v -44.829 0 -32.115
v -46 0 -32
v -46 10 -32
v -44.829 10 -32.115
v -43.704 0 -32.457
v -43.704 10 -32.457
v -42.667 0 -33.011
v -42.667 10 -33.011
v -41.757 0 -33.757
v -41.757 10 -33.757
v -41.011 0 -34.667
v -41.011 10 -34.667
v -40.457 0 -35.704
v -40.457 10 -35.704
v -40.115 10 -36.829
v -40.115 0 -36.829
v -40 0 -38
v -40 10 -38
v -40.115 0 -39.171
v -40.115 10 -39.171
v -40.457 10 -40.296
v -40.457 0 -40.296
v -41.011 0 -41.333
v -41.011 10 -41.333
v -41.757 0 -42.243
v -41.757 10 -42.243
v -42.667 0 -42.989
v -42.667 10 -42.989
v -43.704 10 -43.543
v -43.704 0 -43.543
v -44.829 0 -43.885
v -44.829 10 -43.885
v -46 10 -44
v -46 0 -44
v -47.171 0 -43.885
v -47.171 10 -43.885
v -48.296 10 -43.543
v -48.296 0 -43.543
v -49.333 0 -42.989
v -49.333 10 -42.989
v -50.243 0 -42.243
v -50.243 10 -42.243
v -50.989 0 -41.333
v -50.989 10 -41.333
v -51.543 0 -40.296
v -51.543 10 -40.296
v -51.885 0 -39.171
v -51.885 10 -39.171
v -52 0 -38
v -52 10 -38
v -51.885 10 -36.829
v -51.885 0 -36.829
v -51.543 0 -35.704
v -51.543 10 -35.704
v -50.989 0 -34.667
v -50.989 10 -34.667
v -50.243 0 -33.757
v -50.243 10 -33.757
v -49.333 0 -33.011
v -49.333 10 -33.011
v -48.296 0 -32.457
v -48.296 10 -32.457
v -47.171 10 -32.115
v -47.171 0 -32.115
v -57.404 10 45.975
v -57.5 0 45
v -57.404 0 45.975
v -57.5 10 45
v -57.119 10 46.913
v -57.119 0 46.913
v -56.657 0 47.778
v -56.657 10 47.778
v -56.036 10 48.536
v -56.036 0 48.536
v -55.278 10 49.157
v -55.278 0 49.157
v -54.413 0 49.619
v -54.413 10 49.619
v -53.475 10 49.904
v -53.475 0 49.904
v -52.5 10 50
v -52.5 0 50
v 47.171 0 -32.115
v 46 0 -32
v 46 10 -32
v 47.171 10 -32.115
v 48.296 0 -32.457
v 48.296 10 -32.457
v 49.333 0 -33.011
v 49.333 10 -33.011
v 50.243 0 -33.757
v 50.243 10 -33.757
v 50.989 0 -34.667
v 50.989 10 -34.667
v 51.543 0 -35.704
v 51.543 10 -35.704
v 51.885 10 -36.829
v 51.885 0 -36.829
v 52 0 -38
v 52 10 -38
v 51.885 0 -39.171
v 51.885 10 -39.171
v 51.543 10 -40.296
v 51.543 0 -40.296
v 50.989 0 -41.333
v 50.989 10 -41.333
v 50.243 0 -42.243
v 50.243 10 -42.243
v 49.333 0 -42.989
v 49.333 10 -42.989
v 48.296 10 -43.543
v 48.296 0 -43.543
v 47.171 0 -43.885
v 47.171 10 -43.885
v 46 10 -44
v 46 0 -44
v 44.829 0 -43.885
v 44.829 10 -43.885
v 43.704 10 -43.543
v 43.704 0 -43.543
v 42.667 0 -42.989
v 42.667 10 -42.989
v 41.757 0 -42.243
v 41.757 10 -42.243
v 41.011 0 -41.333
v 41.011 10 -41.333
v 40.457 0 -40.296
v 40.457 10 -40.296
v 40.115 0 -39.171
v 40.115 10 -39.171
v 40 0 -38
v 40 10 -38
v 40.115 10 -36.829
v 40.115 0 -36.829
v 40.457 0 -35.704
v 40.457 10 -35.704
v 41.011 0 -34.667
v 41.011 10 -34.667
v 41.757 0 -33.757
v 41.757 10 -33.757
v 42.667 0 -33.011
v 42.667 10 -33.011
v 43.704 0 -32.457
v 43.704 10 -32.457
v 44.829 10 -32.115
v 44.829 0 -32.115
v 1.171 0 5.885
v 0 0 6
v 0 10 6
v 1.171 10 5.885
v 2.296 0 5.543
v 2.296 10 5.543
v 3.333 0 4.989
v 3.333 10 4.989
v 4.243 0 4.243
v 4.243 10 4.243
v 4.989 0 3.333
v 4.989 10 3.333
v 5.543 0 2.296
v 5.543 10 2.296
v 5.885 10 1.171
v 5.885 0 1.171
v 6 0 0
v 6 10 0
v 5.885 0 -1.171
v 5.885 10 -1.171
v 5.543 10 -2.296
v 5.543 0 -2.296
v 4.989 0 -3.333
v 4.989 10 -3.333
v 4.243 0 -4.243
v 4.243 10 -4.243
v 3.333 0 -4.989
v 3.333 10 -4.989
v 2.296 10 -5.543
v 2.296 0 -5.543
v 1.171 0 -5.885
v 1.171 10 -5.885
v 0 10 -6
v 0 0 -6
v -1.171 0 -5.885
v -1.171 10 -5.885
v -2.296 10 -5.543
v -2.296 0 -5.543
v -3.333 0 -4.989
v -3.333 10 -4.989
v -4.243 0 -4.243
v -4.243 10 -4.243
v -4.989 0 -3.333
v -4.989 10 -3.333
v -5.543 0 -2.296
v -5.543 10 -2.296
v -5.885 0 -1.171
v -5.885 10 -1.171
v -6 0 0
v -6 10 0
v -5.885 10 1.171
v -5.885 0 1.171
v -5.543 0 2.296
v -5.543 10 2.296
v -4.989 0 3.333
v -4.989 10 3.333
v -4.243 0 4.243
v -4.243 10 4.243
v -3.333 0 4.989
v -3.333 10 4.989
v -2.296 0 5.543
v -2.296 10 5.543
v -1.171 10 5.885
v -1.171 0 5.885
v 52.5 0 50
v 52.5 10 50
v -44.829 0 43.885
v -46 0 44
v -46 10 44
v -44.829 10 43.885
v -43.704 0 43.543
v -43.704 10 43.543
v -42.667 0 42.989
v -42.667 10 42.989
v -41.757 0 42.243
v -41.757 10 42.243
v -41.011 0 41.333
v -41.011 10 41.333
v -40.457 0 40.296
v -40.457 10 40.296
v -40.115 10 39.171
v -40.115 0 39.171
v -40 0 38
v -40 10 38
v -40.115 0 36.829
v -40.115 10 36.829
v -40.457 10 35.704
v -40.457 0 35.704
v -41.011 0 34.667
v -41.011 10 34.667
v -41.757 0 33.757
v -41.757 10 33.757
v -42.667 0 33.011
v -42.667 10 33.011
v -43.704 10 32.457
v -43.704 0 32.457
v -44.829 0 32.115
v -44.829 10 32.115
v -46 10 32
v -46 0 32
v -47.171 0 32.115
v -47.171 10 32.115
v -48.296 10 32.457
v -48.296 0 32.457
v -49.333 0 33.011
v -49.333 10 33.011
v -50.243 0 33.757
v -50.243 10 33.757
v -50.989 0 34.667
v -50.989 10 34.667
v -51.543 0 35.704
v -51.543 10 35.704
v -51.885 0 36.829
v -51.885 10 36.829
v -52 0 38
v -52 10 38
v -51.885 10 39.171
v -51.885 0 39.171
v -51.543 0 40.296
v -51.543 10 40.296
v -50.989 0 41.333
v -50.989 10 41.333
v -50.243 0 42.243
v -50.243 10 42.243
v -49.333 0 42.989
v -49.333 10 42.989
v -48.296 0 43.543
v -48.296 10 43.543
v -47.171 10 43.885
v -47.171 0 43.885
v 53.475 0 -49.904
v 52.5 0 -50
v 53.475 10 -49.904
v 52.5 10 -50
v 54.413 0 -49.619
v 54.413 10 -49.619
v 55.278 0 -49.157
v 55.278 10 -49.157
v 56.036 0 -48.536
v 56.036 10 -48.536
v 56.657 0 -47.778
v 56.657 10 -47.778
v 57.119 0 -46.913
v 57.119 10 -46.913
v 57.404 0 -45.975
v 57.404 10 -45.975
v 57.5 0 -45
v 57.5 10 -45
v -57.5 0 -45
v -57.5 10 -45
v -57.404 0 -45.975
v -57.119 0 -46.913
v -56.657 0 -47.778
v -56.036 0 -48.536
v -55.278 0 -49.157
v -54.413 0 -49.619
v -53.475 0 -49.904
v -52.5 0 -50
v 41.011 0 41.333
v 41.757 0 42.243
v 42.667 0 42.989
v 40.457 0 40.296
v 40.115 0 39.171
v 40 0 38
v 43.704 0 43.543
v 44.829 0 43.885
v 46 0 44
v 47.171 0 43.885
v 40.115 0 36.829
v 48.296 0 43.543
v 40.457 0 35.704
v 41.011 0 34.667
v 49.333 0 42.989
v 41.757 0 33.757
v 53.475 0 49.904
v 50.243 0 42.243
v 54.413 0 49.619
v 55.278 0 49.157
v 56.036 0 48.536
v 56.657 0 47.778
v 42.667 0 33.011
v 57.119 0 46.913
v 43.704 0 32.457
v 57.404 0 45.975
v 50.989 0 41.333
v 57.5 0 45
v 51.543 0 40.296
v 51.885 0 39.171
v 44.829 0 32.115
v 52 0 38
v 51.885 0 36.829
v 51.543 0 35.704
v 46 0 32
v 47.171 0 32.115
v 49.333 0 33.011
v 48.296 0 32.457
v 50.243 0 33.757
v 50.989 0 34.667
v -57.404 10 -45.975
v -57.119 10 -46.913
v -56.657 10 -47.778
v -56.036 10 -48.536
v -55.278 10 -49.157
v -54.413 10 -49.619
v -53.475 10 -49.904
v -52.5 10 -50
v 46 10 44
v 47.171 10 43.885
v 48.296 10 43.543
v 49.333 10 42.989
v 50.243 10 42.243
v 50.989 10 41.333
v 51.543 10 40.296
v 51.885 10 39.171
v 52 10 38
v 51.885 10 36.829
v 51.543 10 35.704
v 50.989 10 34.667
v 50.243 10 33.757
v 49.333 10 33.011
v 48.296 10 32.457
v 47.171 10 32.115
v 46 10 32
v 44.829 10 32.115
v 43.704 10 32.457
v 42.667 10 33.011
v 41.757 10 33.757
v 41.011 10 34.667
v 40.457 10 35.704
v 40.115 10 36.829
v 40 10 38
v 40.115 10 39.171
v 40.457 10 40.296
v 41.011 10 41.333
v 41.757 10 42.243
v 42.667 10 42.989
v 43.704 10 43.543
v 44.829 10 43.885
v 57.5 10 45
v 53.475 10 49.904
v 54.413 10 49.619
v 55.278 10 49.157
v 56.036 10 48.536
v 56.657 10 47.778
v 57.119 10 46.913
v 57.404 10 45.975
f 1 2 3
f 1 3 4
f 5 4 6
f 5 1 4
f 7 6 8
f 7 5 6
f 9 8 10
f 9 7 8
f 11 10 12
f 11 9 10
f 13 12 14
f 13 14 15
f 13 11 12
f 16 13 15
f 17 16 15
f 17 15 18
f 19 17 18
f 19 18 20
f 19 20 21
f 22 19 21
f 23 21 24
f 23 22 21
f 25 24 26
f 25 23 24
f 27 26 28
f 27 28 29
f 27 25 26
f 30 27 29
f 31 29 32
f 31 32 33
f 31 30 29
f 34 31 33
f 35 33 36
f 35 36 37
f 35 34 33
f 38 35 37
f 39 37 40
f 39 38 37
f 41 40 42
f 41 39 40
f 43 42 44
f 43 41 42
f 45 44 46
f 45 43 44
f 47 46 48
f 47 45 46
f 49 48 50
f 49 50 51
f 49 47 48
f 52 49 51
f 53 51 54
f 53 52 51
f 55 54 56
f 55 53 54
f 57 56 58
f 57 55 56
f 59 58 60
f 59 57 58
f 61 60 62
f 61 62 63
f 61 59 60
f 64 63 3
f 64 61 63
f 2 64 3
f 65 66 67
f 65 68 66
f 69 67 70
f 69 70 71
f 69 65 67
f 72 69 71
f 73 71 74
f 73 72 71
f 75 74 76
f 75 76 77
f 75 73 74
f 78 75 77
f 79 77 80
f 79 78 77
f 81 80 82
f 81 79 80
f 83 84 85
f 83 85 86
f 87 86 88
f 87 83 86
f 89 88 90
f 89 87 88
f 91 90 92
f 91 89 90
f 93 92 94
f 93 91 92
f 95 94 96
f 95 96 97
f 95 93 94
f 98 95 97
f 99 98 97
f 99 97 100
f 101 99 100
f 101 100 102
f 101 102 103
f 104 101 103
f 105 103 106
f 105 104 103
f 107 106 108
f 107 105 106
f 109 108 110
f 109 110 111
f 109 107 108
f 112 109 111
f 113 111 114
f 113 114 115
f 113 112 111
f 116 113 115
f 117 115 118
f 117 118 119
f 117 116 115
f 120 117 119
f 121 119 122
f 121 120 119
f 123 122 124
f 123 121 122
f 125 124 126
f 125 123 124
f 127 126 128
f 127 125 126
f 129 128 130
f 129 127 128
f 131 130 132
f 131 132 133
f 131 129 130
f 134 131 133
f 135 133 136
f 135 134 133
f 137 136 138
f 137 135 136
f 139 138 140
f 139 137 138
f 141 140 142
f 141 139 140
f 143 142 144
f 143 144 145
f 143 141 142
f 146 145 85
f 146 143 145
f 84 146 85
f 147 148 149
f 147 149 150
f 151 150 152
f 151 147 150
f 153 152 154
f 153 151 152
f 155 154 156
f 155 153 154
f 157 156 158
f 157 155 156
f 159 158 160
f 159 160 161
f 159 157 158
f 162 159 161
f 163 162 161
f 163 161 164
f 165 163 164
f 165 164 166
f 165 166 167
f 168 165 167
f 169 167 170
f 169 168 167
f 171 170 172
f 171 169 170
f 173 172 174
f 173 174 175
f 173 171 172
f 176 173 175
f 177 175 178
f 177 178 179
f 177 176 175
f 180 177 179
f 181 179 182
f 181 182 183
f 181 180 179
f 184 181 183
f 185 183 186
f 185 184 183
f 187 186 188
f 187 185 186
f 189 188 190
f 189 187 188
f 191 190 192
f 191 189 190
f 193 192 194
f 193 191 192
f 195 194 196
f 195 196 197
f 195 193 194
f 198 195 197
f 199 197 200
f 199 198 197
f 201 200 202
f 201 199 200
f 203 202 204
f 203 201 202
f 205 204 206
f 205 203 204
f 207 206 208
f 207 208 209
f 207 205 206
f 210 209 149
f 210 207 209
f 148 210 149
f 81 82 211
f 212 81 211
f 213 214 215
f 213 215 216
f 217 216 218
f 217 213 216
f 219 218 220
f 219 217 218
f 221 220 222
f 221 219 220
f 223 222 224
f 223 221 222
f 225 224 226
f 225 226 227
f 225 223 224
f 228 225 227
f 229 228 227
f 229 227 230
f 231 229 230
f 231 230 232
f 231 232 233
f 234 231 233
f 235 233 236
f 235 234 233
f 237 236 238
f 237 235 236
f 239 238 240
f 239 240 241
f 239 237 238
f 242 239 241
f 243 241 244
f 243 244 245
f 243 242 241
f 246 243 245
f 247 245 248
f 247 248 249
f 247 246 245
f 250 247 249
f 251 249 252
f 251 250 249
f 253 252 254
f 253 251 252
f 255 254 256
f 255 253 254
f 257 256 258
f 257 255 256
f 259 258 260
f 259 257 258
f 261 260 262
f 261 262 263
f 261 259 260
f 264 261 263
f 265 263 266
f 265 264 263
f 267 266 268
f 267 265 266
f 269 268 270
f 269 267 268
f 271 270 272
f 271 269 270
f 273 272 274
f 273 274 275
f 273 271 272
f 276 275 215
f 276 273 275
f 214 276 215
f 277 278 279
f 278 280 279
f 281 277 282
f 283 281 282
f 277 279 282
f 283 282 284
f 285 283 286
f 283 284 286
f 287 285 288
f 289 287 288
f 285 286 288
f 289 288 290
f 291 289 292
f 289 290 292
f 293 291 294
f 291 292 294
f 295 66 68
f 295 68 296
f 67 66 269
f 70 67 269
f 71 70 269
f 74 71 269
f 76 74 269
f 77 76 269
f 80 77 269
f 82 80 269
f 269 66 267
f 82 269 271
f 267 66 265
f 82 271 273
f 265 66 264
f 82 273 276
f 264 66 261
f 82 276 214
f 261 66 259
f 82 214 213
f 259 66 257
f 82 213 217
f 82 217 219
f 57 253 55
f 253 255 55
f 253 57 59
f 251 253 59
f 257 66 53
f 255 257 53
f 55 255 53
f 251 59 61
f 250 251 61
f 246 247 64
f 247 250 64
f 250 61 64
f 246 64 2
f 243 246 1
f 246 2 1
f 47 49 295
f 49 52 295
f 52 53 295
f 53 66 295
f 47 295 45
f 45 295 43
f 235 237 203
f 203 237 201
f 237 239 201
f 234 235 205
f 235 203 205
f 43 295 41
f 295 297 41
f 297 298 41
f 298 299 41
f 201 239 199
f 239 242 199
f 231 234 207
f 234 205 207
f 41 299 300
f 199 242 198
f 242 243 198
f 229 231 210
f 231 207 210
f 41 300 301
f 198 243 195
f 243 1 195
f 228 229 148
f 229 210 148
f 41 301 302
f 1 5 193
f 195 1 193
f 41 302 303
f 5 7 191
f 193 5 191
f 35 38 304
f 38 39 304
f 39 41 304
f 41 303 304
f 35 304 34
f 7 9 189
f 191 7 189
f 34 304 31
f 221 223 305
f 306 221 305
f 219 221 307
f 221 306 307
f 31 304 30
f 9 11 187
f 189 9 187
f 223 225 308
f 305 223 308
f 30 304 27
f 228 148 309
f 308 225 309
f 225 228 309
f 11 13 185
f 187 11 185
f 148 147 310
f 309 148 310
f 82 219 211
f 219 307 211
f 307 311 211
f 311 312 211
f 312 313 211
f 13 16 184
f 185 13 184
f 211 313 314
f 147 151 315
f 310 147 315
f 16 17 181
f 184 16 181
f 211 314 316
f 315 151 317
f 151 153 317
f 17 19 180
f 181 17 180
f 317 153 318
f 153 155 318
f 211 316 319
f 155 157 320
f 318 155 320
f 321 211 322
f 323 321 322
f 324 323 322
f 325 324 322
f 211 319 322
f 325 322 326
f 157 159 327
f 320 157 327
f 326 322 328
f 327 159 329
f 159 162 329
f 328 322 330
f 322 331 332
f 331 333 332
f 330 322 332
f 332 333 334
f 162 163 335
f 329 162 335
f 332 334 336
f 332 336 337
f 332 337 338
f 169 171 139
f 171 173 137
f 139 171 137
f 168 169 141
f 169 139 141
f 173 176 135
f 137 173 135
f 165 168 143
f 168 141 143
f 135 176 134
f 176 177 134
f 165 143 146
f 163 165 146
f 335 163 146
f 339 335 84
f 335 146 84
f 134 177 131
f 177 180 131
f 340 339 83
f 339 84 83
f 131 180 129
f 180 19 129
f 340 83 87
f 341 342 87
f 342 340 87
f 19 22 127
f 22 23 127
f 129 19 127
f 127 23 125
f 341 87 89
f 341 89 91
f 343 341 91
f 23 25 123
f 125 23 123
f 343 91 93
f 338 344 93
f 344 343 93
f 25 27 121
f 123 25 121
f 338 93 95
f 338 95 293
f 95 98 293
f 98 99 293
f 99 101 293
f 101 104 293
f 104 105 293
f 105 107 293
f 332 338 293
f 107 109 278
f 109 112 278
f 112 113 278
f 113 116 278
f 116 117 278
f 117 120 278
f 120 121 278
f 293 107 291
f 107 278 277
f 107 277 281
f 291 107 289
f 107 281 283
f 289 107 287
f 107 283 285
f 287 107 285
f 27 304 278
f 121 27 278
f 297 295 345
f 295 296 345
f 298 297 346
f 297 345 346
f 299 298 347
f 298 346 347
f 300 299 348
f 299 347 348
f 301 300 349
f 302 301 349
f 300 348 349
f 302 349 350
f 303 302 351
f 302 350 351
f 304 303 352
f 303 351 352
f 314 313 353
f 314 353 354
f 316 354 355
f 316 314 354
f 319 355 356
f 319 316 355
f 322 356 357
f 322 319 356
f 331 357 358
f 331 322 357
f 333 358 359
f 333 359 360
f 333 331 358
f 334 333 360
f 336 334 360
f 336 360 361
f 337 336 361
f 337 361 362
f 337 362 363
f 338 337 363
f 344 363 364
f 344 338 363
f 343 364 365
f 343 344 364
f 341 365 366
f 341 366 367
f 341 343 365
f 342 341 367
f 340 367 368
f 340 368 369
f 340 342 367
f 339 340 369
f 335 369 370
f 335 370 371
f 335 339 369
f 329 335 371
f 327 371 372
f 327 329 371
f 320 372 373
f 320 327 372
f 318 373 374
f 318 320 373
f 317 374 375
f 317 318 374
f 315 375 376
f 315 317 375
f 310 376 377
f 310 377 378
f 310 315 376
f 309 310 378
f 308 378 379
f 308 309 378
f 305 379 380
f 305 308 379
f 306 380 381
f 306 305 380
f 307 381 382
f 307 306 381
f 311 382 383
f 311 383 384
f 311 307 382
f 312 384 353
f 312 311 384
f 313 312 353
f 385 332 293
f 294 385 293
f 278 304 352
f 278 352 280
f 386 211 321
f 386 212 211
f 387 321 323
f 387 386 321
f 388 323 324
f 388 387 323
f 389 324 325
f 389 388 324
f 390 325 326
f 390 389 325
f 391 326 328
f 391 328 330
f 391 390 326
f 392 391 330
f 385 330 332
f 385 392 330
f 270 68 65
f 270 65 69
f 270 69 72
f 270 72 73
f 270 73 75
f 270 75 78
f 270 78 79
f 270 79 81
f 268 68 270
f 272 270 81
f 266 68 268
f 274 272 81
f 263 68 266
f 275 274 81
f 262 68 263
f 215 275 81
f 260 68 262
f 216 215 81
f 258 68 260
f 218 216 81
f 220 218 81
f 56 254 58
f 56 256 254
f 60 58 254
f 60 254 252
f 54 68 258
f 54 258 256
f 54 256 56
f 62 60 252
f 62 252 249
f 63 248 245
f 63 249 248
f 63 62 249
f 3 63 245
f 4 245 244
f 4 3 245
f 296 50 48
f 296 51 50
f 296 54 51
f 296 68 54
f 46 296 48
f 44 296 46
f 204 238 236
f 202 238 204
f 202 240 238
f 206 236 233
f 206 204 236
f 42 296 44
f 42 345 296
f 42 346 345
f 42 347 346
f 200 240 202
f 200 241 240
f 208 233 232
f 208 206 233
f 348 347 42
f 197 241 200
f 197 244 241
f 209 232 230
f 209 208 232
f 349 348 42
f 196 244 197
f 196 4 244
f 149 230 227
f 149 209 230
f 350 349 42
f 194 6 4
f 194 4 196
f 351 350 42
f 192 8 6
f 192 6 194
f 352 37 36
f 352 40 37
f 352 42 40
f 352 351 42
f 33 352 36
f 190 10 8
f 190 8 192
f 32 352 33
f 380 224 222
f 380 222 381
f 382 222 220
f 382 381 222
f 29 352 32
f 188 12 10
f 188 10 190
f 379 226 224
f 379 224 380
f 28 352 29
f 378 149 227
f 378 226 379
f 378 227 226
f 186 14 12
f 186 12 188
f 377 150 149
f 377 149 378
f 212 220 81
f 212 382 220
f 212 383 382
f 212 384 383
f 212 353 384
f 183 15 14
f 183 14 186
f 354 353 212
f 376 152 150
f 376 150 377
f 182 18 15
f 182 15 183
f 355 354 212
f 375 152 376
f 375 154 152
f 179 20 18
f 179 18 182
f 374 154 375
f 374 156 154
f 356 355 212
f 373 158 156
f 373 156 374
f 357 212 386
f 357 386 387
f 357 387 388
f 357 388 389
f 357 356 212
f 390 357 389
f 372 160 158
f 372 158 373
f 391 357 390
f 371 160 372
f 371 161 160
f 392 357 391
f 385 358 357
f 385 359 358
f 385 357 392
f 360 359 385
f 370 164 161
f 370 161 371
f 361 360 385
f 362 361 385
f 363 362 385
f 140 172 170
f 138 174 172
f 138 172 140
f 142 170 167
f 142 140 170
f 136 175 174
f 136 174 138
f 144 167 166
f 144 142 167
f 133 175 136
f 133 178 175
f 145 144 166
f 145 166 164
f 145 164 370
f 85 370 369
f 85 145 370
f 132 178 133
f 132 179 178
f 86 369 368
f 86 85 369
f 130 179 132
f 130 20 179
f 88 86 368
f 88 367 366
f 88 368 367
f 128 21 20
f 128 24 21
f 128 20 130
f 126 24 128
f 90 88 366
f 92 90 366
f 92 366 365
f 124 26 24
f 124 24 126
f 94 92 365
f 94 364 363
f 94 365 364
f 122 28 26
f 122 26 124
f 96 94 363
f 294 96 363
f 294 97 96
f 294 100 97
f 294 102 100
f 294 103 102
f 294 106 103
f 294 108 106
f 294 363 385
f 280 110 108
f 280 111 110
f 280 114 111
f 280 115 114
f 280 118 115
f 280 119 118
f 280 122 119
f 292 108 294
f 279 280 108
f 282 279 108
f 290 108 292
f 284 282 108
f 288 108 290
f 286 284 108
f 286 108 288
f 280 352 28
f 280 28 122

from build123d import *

# Parameters (mm, degrees)
SKETCH1_W           = 115
SKETCH1_H           = 100
SKETCH1_R           = 6
BOSS_EXTRUDE2_DEPTH = 10
FILLET1_R           = 5


with BuildPart() as part:
    # Sketch1 → Boss-Extrude2 (new body)
    with BuildSketch(Plane(origin=(0, 0, 0), x_dir=(1, 0, 0), z_dir=(0, 1, 0))):
        Rectangle(SKETCH1_W, SKETCH1_H)
        with Locations(Location((-46, 38, 0), (0, 0, 270))):
            Circle(SKETCH1_R, mode=Mode.SUBTRACT)
        with Locations(Location((46, 38, 0), (0, 0, 270))):
            Circle(SKETCH1_R, mode=Mode.SUBTRACT)
        with Locations(Location((46, -38, 0), (0, 0, 270))):
            Circle(SKETCH1_R, mode=Mode.SUBTRACT)
        with Locations(Location((-46, -38, 0), (0, 0, 270))):
            Circle(SKETCH1_R, mode=Mode.SUBTRACT)
        with Locations(Location((0, 0, 0), (0, 0, 270))):
            Circle(SKETCH1_R, mode=Mode.SUBTRACT)
    extrude(amount=BOSS_EXTRUDE2_DEPTH)

    # Fillet1
    fillet1_edges = [part.edges().sort_by_distance(p)[0] for p in [
        (-57.5, 5, -50),
        (57.5, 5, -50),
        (57.5, 5, 50),
        (-57.5, 5, 50),
    ]]
    fillet(fillet1_edges, radius=FILLET1_R)


solid = part.part
